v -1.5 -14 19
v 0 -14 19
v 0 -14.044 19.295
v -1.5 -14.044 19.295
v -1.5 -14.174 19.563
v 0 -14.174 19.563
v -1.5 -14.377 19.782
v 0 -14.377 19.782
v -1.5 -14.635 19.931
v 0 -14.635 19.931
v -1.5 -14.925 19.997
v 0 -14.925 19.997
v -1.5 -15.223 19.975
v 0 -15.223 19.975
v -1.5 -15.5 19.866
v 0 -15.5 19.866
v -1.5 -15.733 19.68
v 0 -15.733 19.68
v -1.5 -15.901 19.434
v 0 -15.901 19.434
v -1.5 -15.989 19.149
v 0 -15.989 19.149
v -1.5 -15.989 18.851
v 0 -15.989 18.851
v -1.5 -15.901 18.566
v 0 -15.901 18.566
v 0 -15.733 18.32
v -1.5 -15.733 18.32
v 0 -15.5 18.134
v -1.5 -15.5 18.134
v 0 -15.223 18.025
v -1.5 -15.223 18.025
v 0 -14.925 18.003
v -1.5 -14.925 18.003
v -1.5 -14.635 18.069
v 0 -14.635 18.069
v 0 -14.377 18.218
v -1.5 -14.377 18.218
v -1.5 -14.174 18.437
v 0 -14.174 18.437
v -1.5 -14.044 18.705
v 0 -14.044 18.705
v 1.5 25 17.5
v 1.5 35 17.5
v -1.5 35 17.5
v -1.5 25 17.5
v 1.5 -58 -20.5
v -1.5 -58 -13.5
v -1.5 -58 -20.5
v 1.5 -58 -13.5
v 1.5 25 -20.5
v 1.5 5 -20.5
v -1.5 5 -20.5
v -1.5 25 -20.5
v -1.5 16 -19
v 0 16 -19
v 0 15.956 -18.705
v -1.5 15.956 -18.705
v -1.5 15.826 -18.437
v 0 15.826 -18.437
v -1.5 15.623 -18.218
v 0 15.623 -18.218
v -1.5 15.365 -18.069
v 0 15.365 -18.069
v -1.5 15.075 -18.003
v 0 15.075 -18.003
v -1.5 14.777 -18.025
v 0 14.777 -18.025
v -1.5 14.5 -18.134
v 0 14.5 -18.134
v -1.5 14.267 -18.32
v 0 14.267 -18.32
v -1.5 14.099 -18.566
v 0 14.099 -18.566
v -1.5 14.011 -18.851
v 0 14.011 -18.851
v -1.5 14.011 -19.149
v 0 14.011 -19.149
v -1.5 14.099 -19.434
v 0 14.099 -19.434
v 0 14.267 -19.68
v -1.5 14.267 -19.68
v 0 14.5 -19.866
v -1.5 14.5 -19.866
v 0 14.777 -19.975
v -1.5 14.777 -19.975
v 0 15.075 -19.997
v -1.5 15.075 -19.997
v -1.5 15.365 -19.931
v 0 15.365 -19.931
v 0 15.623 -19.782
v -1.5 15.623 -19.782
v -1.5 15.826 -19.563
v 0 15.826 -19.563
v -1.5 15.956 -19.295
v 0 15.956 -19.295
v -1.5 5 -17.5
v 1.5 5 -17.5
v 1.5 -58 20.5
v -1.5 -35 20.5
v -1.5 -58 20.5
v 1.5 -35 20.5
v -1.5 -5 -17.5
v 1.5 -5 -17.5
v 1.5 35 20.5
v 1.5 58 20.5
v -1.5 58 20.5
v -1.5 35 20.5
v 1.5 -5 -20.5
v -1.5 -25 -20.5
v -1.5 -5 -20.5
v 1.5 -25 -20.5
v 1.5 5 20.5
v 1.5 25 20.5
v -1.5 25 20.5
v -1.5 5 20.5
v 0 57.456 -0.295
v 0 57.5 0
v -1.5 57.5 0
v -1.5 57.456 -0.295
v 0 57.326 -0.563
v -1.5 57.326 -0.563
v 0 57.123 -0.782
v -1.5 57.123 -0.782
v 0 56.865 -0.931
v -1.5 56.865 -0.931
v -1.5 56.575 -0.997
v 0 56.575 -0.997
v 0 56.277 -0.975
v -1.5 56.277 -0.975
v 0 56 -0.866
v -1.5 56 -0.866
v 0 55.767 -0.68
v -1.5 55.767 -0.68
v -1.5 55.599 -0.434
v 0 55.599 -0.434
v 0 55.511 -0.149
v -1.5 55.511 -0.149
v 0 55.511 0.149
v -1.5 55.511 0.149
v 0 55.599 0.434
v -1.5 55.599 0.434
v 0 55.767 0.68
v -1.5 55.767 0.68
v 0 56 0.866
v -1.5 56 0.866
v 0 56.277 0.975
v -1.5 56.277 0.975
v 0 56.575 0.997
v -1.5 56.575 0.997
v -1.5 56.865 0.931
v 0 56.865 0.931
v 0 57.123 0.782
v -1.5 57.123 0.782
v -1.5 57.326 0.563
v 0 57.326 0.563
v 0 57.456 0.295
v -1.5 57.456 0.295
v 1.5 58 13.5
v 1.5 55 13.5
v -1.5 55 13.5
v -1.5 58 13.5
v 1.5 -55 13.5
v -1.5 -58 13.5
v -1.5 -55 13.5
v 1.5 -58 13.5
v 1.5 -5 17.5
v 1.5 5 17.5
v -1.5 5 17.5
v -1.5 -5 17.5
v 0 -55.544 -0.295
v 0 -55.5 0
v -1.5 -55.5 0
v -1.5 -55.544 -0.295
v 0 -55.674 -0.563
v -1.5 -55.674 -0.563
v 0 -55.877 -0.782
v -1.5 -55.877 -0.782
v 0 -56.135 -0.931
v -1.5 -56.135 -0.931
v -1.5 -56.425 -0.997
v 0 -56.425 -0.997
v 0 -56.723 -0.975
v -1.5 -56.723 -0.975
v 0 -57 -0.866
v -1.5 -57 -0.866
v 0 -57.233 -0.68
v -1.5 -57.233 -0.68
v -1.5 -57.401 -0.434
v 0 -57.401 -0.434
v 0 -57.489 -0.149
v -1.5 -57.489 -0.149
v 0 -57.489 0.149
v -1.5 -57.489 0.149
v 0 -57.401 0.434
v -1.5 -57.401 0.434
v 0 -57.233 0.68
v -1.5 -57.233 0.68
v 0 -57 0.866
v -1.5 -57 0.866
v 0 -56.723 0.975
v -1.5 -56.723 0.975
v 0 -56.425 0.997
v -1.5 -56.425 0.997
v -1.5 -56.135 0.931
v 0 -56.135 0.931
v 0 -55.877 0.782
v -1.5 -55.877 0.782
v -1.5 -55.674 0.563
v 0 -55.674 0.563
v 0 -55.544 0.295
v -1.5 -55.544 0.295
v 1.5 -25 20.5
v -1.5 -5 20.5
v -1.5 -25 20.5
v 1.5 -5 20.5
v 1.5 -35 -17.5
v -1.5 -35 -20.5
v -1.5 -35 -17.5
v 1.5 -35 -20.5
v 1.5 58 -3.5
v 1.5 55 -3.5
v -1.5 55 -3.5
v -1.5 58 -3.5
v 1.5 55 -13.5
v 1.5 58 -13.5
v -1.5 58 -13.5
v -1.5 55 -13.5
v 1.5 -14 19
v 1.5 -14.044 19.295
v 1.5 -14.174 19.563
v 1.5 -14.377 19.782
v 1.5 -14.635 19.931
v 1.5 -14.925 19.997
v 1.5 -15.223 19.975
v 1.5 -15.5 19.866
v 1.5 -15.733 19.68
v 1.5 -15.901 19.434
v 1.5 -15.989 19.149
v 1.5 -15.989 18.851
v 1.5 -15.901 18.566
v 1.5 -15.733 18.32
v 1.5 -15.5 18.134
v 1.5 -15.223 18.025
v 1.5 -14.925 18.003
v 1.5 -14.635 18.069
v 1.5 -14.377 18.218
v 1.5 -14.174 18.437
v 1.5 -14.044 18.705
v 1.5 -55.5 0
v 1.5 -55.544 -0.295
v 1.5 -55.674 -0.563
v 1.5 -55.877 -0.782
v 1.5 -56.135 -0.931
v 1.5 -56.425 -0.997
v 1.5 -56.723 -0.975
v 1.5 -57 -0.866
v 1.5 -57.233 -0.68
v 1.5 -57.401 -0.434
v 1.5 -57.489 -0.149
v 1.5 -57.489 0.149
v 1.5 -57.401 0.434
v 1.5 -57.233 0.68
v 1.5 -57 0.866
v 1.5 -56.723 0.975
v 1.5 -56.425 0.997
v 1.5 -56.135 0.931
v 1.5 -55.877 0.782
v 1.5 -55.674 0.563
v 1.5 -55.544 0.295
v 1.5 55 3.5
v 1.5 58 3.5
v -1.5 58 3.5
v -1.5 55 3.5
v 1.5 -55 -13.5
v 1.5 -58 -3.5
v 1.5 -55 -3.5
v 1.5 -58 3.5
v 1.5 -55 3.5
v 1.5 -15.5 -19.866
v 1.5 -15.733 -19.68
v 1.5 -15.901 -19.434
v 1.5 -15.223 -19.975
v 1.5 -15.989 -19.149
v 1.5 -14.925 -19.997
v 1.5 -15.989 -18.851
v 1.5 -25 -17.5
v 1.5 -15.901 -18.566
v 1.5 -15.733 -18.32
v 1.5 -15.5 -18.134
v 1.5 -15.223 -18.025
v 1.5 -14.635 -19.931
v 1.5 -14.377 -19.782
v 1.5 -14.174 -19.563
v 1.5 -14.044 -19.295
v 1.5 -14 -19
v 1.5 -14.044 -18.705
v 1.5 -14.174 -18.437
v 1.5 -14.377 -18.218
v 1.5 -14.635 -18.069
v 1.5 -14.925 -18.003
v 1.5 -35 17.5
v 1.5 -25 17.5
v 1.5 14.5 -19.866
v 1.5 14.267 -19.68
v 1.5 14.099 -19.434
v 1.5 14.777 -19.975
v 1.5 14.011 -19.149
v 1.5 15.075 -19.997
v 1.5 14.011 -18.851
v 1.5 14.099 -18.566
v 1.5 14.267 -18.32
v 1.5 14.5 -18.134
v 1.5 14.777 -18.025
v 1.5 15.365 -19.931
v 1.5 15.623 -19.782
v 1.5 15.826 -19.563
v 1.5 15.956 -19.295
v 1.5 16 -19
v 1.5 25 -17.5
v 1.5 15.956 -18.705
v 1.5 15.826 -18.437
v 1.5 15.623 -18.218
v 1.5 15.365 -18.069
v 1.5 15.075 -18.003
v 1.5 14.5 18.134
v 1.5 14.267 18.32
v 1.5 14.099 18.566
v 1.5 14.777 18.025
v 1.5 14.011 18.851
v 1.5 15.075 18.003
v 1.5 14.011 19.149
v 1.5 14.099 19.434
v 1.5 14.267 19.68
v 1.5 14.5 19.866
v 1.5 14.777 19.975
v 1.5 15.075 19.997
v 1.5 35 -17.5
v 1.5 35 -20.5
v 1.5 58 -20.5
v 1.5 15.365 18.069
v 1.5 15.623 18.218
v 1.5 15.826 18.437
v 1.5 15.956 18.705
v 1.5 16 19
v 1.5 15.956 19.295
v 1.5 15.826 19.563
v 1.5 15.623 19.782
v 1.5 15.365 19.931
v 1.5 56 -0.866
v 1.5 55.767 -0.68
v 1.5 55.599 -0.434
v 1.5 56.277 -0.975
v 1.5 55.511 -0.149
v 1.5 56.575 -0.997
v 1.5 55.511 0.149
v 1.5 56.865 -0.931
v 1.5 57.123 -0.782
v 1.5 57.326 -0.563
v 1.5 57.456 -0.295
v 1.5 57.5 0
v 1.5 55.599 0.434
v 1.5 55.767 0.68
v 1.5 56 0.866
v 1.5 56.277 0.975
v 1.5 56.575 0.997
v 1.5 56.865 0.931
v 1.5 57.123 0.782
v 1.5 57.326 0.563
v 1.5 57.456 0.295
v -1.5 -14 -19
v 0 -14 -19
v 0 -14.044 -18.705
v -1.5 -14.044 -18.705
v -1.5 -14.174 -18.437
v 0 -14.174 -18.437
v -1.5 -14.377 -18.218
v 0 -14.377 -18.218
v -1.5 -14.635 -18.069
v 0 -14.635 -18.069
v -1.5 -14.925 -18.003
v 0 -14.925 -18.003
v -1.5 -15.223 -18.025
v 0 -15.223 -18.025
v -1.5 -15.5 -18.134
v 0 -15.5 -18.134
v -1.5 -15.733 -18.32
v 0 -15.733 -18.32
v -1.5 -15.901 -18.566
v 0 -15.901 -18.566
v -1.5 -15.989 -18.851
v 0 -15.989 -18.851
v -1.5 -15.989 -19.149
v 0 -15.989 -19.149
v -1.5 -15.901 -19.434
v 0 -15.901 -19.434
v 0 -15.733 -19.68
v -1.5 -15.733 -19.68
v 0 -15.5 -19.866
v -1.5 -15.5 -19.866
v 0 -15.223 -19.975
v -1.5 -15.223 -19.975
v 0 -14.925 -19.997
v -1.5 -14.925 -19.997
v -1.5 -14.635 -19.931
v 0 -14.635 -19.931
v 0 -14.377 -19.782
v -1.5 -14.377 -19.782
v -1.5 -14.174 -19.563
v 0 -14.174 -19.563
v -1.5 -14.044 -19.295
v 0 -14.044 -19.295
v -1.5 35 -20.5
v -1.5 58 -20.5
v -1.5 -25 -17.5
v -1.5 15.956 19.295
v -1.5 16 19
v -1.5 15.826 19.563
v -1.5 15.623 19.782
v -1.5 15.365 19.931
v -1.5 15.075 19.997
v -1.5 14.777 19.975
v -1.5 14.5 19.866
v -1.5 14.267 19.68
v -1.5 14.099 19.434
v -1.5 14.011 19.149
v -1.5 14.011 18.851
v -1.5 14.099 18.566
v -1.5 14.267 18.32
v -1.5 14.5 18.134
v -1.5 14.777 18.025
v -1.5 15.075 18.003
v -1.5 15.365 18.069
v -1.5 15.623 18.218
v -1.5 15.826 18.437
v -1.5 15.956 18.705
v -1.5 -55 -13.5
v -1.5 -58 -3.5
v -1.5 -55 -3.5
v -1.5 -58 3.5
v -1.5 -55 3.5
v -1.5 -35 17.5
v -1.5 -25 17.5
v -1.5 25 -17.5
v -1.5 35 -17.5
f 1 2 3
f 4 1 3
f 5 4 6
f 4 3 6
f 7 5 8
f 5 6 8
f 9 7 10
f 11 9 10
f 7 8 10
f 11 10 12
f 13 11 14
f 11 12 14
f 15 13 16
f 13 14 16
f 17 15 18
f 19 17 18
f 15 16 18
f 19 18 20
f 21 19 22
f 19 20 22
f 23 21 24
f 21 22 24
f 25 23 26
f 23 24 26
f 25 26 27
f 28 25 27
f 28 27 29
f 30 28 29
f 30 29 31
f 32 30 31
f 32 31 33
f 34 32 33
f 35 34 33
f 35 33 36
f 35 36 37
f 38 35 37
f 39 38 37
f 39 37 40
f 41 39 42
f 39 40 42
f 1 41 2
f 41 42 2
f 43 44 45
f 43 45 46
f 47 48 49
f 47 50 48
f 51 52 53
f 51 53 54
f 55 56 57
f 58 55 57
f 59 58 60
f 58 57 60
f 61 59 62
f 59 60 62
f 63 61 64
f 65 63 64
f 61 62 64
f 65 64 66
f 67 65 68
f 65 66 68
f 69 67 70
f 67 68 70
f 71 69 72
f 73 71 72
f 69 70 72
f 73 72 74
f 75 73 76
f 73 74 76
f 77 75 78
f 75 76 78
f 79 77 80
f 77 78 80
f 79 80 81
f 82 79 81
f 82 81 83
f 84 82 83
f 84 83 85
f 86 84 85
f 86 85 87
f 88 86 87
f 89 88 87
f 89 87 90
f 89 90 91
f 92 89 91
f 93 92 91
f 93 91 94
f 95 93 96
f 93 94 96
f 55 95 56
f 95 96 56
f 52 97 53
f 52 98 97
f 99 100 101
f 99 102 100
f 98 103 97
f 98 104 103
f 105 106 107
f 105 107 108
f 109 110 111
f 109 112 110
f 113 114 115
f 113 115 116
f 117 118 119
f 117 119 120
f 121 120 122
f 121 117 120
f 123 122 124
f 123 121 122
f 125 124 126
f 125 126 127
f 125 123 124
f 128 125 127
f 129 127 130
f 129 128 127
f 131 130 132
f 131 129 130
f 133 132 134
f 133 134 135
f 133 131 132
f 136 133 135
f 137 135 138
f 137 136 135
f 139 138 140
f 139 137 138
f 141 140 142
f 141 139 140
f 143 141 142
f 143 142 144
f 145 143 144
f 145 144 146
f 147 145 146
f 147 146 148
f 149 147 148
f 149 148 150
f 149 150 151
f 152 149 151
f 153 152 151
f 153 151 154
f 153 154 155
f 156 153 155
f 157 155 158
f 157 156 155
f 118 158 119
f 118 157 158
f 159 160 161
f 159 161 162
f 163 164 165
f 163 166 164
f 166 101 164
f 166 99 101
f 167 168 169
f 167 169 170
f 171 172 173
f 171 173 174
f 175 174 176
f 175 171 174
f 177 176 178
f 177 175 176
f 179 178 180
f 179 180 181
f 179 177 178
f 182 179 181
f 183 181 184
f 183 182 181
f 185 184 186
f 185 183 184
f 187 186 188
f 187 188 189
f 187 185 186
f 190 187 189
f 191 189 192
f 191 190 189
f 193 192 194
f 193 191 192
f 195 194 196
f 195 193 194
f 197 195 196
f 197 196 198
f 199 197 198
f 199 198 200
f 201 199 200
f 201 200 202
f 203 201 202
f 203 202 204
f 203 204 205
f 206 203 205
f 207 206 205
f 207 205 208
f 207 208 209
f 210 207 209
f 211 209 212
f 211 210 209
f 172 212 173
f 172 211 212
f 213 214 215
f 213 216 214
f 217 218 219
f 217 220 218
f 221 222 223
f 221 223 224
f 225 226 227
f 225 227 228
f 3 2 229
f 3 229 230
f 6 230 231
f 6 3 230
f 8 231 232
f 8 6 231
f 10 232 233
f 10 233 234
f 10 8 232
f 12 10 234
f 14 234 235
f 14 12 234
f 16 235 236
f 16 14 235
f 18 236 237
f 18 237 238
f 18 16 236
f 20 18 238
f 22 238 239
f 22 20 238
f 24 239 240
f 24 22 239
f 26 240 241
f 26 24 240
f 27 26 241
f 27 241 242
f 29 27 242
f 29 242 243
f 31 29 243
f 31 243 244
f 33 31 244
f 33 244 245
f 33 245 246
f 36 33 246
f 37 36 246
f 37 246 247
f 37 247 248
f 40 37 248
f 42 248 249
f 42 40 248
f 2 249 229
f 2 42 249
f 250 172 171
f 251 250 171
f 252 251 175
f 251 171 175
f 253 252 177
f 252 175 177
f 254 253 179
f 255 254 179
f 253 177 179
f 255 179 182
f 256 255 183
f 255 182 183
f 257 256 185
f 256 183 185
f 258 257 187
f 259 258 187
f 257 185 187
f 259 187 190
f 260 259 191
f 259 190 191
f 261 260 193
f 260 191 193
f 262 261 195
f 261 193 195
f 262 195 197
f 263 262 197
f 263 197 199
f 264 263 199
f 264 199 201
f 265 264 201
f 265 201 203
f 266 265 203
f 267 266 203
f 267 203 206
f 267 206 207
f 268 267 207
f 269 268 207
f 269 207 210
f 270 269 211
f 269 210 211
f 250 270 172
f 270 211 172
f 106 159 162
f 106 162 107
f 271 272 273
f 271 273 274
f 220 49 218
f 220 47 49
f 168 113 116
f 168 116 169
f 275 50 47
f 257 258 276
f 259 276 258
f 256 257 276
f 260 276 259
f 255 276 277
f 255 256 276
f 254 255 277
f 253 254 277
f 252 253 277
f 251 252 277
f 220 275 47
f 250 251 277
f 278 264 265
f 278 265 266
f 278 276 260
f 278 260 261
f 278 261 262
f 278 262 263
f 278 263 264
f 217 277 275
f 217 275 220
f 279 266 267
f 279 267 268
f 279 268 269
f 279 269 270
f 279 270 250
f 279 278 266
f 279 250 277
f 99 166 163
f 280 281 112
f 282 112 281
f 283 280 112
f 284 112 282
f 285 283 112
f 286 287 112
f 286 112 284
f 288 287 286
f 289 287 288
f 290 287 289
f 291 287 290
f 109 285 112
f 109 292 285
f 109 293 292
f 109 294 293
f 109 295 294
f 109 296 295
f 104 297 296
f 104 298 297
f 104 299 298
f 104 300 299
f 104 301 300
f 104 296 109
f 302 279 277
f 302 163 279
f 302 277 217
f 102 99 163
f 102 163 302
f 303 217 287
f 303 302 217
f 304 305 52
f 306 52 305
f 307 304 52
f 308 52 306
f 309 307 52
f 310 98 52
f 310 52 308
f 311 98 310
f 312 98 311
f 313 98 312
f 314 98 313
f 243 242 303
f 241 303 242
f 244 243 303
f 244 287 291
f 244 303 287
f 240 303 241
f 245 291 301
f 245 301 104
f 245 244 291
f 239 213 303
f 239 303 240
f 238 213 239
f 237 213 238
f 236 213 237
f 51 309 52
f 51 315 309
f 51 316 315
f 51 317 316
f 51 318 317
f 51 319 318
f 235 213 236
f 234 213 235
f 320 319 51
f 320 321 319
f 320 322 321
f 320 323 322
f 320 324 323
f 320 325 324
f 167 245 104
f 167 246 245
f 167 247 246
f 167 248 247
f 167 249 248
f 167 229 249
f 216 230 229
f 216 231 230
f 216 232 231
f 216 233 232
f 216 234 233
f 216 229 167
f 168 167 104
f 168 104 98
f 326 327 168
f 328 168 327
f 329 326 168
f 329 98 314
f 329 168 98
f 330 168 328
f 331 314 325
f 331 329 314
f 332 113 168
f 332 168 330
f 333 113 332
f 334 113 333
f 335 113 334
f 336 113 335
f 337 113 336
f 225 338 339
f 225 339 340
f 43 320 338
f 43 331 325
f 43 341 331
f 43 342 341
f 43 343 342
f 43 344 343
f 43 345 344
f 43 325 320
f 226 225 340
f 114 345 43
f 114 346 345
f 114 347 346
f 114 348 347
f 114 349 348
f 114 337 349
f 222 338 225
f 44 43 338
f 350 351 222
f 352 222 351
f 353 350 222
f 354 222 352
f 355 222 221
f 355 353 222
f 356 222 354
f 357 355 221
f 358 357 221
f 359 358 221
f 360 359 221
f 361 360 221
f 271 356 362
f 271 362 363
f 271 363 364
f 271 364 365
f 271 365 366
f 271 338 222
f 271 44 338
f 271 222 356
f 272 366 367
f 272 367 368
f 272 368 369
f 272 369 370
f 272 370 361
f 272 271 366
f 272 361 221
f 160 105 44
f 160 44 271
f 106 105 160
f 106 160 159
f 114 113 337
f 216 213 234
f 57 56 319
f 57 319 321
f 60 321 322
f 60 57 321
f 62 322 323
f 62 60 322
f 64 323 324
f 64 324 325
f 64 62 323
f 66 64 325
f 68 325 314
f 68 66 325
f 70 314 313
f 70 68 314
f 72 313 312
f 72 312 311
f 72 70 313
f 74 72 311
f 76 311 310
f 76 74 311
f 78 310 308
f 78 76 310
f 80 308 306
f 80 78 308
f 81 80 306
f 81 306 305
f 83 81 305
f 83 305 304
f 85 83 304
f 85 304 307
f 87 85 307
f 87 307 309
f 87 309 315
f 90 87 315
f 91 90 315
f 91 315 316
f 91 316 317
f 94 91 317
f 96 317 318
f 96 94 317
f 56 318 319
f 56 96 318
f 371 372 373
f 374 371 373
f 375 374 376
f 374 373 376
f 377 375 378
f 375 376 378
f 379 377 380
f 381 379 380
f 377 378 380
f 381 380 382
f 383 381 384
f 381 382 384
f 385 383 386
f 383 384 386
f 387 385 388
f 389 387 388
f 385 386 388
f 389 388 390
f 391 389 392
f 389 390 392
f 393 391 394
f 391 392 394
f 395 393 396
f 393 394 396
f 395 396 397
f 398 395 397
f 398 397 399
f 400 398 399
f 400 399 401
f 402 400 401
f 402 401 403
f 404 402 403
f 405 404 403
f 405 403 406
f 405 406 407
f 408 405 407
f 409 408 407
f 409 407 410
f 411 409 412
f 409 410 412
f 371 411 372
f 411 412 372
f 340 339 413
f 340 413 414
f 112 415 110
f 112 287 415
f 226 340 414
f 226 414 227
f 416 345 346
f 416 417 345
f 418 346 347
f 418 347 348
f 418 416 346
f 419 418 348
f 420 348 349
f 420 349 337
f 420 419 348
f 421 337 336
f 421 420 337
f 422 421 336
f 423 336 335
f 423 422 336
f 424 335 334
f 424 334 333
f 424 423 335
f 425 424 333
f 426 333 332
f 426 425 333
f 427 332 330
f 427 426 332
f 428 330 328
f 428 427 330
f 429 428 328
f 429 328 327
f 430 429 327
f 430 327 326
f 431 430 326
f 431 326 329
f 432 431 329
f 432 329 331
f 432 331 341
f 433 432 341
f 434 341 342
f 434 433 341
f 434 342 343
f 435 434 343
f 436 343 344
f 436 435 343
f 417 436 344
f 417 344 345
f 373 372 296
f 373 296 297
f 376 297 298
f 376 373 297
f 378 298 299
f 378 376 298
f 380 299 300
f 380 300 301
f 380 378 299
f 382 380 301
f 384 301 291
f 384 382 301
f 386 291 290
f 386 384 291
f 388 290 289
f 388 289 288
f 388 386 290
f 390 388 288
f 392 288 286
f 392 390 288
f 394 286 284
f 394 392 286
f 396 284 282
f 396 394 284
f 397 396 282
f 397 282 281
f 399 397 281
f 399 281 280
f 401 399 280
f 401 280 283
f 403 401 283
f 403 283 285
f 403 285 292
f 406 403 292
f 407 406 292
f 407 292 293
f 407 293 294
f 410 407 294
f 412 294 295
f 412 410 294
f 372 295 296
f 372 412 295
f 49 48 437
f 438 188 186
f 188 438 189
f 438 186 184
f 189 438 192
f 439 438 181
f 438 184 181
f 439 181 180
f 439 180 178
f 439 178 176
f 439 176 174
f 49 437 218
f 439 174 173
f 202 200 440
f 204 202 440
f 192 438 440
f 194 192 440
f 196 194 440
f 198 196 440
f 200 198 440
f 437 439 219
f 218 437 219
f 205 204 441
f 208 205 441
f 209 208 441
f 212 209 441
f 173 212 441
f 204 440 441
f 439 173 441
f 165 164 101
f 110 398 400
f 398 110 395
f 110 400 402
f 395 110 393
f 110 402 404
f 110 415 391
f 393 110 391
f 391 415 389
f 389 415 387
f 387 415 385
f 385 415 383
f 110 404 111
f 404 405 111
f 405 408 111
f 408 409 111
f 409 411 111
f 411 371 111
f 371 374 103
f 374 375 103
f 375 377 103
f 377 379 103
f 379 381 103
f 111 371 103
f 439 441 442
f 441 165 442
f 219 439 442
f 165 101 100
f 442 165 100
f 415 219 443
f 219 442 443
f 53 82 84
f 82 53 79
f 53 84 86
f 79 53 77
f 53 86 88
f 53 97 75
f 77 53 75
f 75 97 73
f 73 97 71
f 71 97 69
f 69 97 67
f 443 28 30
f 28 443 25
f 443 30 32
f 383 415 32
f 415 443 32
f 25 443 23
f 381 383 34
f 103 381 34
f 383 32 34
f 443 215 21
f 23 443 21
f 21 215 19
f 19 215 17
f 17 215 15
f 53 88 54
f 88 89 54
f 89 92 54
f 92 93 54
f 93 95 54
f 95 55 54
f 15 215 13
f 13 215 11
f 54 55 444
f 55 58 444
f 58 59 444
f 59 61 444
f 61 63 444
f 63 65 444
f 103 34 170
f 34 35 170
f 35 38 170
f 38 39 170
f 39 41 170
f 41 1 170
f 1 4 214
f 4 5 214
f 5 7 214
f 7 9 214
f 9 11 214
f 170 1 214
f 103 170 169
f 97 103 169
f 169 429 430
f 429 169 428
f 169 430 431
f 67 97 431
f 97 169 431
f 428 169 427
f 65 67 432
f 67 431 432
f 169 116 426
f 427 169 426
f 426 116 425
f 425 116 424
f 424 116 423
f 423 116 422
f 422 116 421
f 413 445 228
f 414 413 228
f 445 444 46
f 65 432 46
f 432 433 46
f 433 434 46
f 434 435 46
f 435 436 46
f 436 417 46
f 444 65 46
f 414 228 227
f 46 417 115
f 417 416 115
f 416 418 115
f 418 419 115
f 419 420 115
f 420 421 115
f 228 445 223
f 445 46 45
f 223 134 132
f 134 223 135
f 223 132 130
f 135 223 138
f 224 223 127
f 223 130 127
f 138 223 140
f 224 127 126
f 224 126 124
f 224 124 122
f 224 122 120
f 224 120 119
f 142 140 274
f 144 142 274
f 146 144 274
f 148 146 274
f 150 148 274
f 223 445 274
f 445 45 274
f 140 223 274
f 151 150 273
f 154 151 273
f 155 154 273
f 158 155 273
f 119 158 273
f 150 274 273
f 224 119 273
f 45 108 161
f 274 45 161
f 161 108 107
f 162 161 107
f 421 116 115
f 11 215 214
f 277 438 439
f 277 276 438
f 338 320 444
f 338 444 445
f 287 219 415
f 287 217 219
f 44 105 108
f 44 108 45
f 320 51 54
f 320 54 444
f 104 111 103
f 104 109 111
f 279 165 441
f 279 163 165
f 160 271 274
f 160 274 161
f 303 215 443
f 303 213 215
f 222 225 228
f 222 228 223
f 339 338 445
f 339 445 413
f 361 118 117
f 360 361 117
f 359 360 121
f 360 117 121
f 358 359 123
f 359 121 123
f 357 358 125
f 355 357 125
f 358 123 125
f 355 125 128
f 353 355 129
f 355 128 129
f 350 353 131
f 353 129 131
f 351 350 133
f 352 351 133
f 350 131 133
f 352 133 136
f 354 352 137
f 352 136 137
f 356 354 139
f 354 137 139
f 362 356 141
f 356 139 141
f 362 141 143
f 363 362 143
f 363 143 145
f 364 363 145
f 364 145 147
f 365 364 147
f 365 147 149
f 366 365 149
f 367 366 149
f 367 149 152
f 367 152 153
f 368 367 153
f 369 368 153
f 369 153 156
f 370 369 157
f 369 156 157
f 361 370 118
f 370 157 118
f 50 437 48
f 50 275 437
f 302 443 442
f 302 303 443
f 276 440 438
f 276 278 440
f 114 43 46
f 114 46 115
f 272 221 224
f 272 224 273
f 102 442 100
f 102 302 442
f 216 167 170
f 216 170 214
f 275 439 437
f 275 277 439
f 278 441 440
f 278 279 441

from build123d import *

# Parameters (mm, degrees)
F0_R     = 1
F1_DEPTH = 1.5


with BuildPart() as f1:
    # F0 (on Right) → F1 (new body, symmetric)
    with BuildSketch(Plane.YZ):
        with BuildLine():
            ThreePointArc((55.5, 0), (56.5, 1), (57.5, 0))
            Line((57.5, 0), (58, 0))
            Line((58, 0), (58, 3.5))
            Line((58, 3.5), (55, 3.5))
            Line((55, 3.5), (55, 13.5))
            Line((55, 13.5), (58, 13.5))
            Line((58, 13.5), (58, 20.5))
            Line((58, 20.5), (35, 20.5))
            Line((35, 20.5), (35, 17.5))
            Line((35, 17.5), (25, 17.5))
            Line((25, 17.5), (25, 20.5))
            Line((25, 20.5), (5, 20.5))
            Line((5, 20.5), (5, 17.5))
            Line((5, 17.5), (0, 17.5))
            Line((0, 17.5), (0, 0))
            Line((0, 0), (55.5, 0))
        make_face()
        with Locations((15, 19)):
            Circle(F0_R, mode=Mode.SUBTRACT)
        with BuildLine():
            Line((58, 0), (57.5, 0))
            ThreePointArc((57.5, 0), (56.5, -1), (55.5, 0))
            Line((55.5, 0), (0, 0))
            Line((0, 0), (0, -17.5))
            Line((0, -17.5), (5, -17.5))
            Line((5, -17.5), (5, -20.5))
            Line((5, -20.5), (25, -20.5))
            Line((25, -20.5), (25, -17.5))
            Line((25, -17.5), (35, -17.5))
            Line((35, -17.5), (35, -20.5))
            Line((35, -20.5), (58, -20.5))
            Line((58, -20.5), (58, -13.5))
            Line((58, -13.5), (55, -13.5))
            Line((55, -13.5), (55, -3.5))
            Line((55, -3.5), (58, -3.5))
            Line((58, -3.5), (58, 0))
        make_face()
        with Locations((15, -19)):
            Circle(F0_R, mode=Mode.SUBTRACT)
        with BuildLine():
            Line((-55.5, 0), (0, 0))
            Line((0, 0), (0, 17.5))
            Line((0, 17.5), (-5, 17.5))
            Line((-5, 17.5), (-5, 20.5))
            Line((-5, 20.5), (-25, 20.5))
            Line((-25, 20.5), (-25, 17.5))
            Line((-25, 17.5), (-35, 17.5))
            Line((-35, 17.5), (-35, 20.5))
            Line((-35, 20.5), (-58, 20.5))
            Line((-58, 20.5), (-58, 13.5))
            Line((-58, 13.5), (-55, 13.5))
            Line((-55, 13.5), (-55, 3.5))
            Line((-55, 3.5), (-58, 3.5))
            Line((-58, 3.5), (-58, 0))
            Line((-58, 0), (-57.5, 0))
            ThreePointArc((-57.5, 0), (-56.5, 1), (-55.5, 0))
        make_face()
        with Locations((-15, 19)):
            Circle(F0_R, mode=Mode.SUBTRACT)
        with BuildLine():
            Line((0, -17.5), (0, 0))
            Line((0, 0), (-55.5, 0))
            ThreePointArc((-55.5, 0), (-56.5, -1), (-57.5, 0))
            Line((-57.5, 0), (-58, 0))
            Line((-58, 0), (-58, -3.5))
            Line((-58, -3.5), (-55, -3.5))
            Line((-55, -3.5), (-55, -13.5))
            Line((-55, -13.5), (-58, -13.5))
            Line((-58, -13.5), (-58, -20.5))
            Line((-58, -20.5), (-35, -20.5))
            Line((-35, -20.5), (-35, -17.5))
            Line((-35, -17.5), (-25, -17.5))
            Line((-25, -17.5), (-25, -20.5))
            Line((-25, -20.5), (-5, -20.5))
            Line((-5, -20.5), (-5, -17.5))
            Line((-5, -17.5), (0, -17.5))
        make_face()
        with Locations((-15, -19)):
            Circle(F0_R, mode=Mode.SUBTRACT)
    extrude(amount=F1_DEPTH, both=True)


solid = f1.part
